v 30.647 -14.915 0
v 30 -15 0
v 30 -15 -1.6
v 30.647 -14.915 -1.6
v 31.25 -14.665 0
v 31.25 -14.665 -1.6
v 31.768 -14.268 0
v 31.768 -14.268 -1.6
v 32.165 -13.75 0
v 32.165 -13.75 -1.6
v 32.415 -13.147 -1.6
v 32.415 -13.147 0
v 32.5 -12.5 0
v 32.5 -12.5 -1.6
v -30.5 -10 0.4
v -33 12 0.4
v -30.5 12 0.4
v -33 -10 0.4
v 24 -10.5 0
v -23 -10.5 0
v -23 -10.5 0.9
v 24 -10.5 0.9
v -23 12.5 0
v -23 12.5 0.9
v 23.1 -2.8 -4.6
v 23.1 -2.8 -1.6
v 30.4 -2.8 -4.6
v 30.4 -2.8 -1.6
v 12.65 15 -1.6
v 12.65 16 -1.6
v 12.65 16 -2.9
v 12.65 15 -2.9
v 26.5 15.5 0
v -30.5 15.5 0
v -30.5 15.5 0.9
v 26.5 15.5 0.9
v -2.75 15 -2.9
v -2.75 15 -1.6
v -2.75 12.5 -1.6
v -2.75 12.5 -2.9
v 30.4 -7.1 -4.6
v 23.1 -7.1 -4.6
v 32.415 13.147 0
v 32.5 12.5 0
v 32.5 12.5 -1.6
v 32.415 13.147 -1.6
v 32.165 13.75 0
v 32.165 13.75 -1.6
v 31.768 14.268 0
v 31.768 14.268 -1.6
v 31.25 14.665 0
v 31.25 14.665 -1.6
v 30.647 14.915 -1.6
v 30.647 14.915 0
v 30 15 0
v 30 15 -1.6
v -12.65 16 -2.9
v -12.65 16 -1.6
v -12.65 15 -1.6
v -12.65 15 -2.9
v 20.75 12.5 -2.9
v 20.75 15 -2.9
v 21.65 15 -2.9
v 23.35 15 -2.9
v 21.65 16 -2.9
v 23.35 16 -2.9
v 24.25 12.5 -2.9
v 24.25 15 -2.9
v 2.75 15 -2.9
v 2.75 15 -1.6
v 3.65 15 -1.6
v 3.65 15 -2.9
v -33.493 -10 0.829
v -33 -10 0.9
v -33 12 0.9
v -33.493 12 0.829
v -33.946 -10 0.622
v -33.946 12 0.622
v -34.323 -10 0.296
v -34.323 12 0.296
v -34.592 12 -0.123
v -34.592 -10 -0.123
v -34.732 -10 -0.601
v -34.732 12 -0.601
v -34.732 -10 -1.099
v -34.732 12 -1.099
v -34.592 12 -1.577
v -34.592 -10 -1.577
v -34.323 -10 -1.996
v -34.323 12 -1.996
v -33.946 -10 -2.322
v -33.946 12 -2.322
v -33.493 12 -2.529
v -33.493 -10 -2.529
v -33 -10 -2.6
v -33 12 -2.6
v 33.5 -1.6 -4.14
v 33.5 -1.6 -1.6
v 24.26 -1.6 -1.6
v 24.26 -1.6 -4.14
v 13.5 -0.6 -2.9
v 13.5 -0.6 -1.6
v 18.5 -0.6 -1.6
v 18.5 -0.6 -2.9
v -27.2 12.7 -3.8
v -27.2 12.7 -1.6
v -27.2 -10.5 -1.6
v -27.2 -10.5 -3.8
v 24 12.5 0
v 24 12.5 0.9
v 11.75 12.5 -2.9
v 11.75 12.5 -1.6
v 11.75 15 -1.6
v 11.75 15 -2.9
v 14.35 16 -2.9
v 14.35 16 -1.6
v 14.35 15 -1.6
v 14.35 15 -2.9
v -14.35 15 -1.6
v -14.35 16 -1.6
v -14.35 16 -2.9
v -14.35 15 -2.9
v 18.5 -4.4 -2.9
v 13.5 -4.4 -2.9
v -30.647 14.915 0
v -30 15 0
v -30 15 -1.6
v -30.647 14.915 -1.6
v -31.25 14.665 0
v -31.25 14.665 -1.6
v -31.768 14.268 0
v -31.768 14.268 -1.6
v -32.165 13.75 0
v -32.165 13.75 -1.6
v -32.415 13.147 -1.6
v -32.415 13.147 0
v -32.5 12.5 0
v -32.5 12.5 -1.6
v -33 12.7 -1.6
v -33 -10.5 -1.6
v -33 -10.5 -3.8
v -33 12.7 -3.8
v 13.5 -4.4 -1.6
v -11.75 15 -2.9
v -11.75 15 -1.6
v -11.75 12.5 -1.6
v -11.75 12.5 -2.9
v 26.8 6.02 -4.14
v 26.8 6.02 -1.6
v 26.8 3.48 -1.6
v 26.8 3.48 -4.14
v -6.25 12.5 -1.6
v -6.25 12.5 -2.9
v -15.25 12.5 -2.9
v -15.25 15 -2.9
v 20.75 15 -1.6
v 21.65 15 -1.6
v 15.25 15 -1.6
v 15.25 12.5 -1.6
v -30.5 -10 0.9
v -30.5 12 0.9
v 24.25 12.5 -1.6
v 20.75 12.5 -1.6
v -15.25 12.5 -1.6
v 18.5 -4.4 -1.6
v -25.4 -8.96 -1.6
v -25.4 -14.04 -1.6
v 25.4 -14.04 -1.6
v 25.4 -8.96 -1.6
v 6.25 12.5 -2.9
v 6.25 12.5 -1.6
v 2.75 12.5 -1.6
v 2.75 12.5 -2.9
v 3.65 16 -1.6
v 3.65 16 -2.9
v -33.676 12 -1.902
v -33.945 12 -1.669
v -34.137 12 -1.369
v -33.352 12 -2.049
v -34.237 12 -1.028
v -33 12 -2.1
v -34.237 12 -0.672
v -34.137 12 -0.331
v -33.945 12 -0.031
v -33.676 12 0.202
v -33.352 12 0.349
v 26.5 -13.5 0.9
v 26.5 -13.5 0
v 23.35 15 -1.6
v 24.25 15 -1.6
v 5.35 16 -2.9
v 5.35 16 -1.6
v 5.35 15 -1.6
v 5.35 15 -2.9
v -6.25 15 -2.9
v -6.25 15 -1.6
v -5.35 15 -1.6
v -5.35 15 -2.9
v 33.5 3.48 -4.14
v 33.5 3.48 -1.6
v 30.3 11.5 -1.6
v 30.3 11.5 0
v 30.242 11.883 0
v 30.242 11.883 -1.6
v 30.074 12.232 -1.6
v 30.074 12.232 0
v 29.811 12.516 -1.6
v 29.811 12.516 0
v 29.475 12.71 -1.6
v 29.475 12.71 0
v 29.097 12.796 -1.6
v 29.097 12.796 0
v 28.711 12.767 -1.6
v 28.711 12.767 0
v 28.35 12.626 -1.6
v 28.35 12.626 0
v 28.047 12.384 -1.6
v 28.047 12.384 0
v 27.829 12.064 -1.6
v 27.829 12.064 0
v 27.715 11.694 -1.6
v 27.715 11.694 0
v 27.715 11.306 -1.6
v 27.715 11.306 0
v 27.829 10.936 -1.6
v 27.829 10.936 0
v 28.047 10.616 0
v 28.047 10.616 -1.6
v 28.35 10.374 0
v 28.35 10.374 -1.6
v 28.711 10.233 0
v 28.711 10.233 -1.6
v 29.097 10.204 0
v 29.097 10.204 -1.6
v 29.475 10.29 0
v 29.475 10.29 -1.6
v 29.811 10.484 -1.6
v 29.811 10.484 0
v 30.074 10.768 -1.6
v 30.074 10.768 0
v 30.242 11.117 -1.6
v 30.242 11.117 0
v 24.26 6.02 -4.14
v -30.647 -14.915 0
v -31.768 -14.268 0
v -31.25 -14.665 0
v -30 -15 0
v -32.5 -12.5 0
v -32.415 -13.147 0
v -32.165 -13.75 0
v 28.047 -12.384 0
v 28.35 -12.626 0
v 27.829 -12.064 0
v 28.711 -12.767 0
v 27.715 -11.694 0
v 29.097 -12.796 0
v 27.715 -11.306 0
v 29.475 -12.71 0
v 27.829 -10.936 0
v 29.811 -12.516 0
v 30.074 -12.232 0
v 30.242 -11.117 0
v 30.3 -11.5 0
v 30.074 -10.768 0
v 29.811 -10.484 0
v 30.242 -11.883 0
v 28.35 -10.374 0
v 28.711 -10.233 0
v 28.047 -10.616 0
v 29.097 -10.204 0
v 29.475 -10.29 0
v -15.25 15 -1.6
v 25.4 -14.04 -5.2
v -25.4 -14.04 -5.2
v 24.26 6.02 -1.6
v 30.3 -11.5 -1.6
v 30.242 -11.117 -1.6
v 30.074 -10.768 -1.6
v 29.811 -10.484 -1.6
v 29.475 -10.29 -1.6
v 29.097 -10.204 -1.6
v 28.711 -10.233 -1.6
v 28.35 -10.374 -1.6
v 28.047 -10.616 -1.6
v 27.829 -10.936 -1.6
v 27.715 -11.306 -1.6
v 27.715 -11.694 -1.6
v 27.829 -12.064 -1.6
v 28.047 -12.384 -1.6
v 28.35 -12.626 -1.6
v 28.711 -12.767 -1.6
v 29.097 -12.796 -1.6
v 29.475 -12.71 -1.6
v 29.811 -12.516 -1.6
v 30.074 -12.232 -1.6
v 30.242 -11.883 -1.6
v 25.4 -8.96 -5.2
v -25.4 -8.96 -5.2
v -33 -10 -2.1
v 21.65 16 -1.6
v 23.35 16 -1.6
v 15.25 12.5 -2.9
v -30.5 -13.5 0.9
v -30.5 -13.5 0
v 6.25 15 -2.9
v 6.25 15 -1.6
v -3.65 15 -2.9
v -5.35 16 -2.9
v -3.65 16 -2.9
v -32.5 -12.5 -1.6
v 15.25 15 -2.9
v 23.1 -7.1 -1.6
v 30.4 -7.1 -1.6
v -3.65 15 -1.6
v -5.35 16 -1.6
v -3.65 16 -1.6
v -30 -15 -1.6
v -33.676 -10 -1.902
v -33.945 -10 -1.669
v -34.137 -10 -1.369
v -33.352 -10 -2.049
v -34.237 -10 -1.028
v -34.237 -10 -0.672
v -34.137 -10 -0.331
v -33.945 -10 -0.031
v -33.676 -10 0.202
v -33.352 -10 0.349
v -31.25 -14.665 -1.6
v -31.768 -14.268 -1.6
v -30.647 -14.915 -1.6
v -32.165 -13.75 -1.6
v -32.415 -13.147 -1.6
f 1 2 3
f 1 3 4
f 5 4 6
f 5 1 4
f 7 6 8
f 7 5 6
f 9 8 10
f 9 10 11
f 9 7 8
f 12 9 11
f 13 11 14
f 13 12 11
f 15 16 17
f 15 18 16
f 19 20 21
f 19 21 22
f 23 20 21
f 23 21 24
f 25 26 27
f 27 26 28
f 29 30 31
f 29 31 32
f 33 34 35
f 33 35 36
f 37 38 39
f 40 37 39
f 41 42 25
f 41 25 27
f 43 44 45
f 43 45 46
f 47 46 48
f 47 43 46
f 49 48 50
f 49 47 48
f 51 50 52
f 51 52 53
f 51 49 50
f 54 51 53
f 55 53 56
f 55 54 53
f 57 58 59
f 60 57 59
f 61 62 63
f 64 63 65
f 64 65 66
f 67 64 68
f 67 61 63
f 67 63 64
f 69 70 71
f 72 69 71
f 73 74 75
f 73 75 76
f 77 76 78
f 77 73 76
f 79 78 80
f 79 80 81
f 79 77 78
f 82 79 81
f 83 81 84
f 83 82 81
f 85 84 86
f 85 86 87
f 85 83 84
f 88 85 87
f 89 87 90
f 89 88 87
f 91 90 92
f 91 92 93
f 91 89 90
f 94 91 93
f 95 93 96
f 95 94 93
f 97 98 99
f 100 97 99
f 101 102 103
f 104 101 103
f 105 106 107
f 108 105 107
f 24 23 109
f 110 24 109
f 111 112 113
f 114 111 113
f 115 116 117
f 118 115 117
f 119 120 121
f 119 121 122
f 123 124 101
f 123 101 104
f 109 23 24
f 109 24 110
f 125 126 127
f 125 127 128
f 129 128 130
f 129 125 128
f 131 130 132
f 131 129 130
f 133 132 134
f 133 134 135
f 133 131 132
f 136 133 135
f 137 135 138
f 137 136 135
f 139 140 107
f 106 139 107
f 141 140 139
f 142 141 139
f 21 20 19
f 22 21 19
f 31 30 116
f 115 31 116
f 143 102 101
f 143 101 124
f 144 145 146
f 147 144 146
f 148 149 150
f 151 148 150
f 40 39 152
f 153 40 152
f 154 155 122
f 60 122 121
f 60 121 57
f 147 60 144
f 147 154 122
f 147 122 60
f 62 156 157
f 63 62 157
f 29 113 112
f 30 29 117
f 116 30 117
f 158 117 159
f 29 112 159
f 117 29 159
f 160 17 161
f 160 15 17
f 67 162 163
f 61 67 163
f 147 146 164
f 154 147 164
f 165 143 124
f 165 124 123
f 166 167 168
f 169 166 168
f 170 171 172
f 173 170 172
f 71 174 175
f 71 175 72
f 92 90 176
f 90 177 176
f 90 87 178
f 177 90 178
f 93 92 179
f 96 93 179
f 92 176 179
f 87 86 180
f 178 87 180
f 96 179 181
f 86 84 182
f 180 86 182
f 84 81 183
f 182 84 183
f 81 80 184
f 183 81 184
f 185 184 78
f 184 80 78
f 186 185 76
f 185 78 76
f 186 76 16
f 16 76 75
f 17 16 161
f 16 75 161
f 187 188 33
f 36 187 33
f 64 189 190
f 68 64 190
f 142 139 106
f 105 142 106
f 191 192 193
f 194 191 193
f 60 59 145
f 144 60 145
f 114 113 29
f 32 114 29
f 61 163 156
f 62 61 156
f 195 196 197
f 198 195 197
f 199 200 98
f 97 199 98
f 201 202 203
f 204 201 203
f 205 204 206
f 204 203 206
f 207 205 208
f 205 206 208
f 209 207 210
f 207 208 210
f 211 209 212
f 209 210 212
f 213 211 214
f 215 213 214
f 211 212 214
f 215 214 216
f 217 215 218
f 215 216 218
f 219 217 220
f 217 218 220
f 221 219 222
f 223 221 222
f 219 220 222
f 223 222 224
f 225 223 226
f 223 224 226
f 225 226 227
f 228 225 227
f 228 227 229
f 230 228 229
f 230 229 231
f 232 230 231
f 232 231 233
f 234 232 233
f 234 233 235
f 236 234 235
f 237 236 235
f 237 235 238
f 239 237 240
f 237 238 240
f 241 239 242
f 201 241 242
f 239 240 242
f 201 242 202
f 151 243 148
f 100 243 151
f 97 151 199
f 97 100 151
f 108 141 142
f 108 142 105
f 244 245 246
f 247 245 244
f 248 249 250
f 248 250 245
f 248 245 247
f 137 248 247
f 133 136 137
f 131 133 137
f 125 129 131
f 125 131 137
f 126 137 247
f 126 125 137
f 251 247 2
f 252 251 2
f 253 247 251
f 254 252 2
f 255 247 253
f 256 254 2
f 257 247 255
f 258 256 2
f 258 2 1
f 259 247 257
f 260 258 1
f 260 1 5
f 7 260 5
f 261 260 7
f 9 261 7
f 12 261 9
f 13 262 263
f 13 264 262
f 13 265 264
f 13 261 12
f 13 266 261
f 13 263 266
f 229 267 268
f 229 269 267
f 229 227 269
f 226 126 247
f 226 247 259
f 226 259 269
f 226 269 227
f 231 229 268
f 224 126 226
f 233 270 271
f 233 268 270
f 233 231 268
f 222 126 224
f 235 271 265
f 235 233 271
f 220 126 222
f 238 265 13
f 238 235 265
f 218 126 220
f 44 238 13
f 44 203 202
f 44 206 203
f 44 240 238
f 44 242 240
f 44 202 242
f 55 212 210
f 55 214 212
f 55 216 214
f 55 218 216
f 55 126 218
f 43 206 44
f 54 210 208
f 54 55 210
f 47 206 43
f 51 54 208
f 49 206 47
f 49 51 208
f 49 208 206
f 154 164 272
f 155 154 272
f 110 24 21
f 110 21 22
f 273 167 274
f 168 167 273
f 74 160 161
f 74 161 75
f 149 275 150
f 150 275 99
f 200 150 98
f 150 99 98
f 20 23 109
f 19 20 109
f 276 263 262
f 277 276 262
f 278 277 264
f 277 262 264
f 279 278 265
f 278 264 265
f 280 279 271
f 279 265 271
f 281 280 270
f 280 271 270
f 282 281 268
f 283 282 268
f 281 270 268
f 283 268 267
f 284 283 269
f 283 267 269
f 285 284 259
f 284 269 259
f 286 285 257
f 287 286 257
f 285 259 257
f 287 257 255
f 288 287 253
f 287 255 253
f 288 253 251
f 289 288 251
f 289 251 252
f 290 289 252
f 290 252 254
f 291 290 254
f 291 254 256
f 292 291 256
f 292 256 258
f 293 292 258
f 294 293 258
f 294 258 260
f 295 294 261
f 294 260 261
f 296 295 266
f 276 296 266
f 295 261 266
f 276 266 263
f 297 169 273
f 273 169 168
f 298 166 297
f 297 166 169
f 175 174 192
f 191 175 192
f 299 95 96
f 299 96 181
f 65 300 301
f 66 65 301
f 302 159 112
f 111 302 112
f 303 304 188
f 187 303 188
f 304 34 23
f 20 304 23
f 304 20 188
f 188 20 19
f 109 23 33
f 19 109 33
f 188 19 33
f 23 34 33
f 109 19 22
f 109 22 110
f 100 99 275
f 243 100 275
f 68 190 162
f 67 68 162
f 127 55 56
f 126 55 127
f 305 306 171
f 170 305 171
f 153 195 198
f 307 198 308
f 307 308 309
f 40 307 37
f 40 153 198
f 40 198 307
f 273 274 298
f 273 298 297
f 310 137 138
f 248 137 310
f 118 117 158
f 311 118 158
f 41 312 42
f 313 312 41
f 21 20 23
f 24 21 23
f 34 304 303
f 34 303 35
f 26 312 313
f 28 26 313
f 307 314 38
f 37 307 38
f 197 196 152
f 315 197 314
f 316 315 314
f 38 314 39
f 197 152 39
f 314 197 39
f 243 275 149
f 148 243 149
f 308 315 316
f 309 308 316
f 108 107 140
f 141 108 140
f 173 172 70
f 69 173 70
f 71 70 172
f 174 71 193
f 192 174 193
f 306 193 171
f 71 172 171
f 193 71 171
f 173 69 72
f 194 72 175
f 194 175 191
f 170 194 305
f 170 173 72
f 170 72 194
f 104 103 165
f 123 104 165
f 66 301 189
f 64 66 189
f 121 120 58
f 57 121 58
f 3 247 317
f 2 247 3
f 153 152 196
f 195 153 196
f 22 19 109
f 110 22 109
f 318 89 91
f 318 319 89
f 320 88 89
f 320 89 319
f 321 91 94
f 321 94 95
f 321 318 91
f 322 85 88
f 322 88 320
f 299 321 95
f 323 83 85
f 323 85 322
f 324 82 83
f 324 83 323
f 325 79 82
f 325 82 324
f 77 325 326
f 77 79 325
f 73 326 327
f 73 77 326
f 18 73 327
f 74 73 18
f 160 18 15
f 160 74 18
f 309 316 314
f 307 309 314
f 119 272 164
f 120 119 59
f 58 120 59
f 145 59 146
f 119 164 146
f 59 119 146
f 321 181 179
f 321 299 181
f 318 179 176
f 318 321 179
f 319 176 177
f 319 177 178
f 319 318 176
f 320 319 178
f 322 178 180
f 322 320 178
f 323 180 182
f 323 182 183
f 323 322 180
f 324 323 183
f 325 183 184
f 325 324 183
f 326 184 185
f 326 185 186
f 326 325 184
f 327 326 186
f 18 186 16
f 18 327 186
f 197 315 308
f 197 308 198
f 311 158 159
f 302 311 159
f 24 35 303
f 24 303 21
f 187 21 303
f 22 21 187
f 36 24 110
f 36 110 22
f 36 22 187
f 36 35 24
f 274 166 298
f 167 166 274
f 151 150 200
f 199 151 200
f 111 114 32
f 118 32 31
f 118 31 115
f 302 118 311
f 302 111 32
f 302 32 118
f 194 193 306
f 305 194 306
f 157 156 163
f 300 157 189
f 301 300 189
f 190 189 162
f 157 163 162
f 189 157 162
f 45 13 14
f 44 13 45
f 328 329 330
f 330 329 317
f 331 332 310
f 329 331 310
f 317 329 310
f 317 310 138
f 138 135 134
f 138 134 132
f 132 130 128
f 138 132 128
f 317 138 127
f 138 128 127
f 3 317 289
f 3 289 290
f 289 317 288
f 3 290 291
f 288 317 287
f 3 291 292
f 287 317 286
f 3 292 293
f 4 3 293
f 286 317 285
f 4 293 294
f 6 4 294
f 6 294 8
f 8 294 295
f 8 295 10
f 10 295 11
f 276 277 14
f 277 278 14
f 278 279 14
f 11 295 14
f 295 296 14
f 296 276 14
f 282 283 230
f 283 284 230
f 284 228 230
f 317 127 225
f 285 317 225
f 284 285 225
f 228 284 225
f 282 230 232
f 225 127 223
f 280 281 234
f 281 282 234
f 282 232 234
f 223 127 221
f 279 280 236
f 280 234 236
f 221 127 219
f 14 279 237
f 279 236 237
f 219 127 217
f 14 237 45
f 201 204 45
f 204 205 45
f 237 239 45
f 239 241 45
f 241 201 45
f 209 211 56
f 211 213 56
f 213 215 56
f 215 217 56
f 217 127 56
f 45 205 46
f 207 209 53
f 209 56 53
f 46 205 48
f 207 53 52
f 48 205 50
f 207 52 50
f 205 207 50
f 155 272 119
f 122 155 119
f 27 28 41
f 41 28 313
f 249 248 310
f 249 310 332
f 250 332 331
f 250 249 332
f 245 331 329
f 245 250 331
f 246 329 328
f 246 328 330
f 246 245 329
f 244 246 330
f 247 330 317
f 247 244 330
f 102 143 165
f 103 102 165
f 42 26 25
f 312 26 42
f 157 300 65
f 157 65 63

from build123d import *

# Parameters (mm, degrees)
F0_R           = 1.3
F1_DEPTH       = 1.6
F2_W           = 47
F2_H           = 23
F3_DEPTH       = 0.9
F2_W_2         = 57
F2_H_2         = 29
F4_DEPTH       = 0.9
F5_W           = 5
F5_H           = 3.8
F6_DEPTH       = 1.3
F5_W_2         = 1.7
F5_H_2         = 1
F7_DEPTH       = 2.2
F5_W_3         = 5.7
F5_H_3         = 5.08
F5_W_4         = 1
F8_DEPTH       = 2.54
F5_W_5         = 7.3
F5_H_4         = 4.3
F9_DEPTH       = 3
F5_W_6         = 50.8
F10_DEPTH      = 3.6
F12_DEPTH      = 10
F12_DEPTH_BACK = 12


with BuildPart() as f1:
    # F0 (on Top) → F1 (new body)
    with BuildSketch(Plane.XY):
        with BuildLine():
            Line((30, 15), (-30, 15))
            ThreePointArc((-30, 15), (-31.767766953, 14.267766953), (-32.5, 12.5))
            Line((-32.5, 12.5), (-32.5, -12.5))
            ThreePointArc((-32.5, -12.5), (-31.767766953, -14.267766953), (-30, -15))
            Line((-30, -15), (30, -15))
            ThreePointArc((30, -15), (31.767766953, -14.267766953), (32.5, -12.5))
            Line((32.5, -12.5), (32.5, 12.5))
            ThreePointArc((32.5, 12.5), (31.767766953, 14.267766953), (30, 15))
        make_face()
        with Locations((29, -11.5)):
            Circle(F0_R, mode=Mode.SUBTRACT)
        with Locations((29, 11.5)):
            Circle(F0_R, mode=Mode.SUBTRACT)
    extrude(amount=-F1_DEPTH)


with BuildPart() as f3:
    # F2 (on Top) → F3 (new body)
    with BuildSketch(Plane.XY):
        with Locations((0.5, 1)):
            Rectangle(F2_W, F2_H)
    extrude(amount=F3_DEPTH)


with BuildPart() as f4:
    # F2 (on Top) → F4 (new body)
    with BuildSketch(Plane.XY):
        with Locations((-2, 1)):
            Rectangle(F2_W_2, F2_H_2)
        with Locations((0.5, 1)):
            Rectangle(F2_W, F2_H, mode=Mode.SUBTRACT)
    extrude(amount=F4_DEPTH)


with BuildPart() as f6:
    # F5 (on face) → F6 (new body)
    with BuildSketch(Plane(origin=(0, 0, -1.6), x_dir=(1, 0, 0), z_dir=(0, 0, -1))):
        with Locations((16, 2.5)):
            Rectangle(F5_W, F5_H)
    extrude(amount=F6_DEPTH)


with BuildPart() as f6b:
    # F5 (on face) → F6, piece 2 (new body)
    with BuildSketch(Plane(origin=(0, 0, -1.6), x_dir=(1, 0, 0), z_dir=(0, 0, -1))):
        Polygon((23.35, -15), (24.25, -15), (24.25, -12.5), (20.75, -12.5), (20.75, -15), (21.65, -15), align=None)
        with Locations((22.5, -15.5)):
            Rectangle(F5_W_2, F5_H_2)
    extrude(amount=F6_DEPTH)


with BuildPart() as f6c:
    # F5 (on face) → F6, piece 3 (new body)
    with BuildSketch(Plane(origin=(0, 0, -1.6), x_dir=(1, 0, 0), z_dir=(0, 0, -1))):
        Polygon((14.35, -15), (15.25, -15), (15.25, -12.5), (11.75, -12.5), (11.75, -15), (12.65, -15), align=None)
        with Locations((13.5, -15.5)):
            Rectangle(F5_W_2, F5_H_2)
    extrude(amount=F6_DEPTH)


with BuildPart() as f6d:
    # F5 (on face) → F6, piece 4 (new body)
    with BuildSketch(Plane(origin=(0, 0, -1.6), x_dir=(1, 0, 0), z_dir=(0, 0, -1))):
        Polygon((5.35, -15), (6.25, -15), (6.25, -12.5), (2.75, -12.5), (2.75, -15), (3.65, -15), align=None)
        with Locations((4.5, -15.5)):
            Rectangle(F5_W_2, F5_H_2)
    extrude(amount=F6_DEPTH)


with BuildPart() as f6e:
    # F5 (on face) → F6, piece 5 (new body)
    with BuildSketch(Plane(origin=(0, 0, -1.6), x_dir=(1, 0, 0), z_dir=(0, 0, -1))):
        Polygon((-3.65, -15), (-2.75, -15), (-2.75, -12.5), (-6.25, -12.5), (-6.25, -15), (-5.35, -15), align=None)
        with Locations((-4.5, -15.5)):
            Rectangle(F5_W_2, F5_H_2)
    extrude(amount=F6_DEPTH)


with BuildPart() as f6f:
    # F5 (on face) → F6, piece 6 (new body)
    with BuildSketch(Plane(origin=(0, 0, -1.6), x_dir=(1, 0, 0), z_dir=(0, 0, -1))):
        Polygon((-15.25, -12.5), (-15.25, -15), (-14.35, -15), (-12.65, -15), (-11.75, -15), (-11.75, -12.5), align=None)
        with Locations((-13.5, -15.5)):
            Rectangle(F5_W_2, F5_H_2)
    extrude(amount=F6_DEPTH)


with BuildPart() as f7:
    # F5 (on face) → F7 (new body)
    with BuildSketch(Plane(origin=(0, 0, -1.6), x_dir=(1, 0, 0), z_dir=(0, 0, -1))):
        with BuildLine():
            Line((-27.2, 10.5), (-32.5, 10.5))
            Line((-32.5, 10.5), (-32.5, -12.5))
            ThreePointArc((-32.5, -12.5), (-32.4979959865, -12.6000802248), (-32.4919871589, -12.7))
            Line((-32.4919871589, -12.7), (-27.2, -12.7))
            Line((-27.2, -12.7), (-27.2, 10.5))
        make_face()
        with BuildLine():
            Line((-32.5, -12.5), (-32.5, 10.5))
            Line((-32.5, 10.5), (-33, 10.5))
            Line((-33, 10.5), (-33, -12.7))
            Line((-33, -12.7), (-32.4919871589, -12.7))
            ThreePointArc((-32.4919871589, -12.7), (-32.4979959865, -12.6000802248), (-32.5, -12.5))
        make_face()
    extrude(amount=F7_DEPTH)


with BuildPart() as f8:
    # F5 (on face) → F8 (new body)
    with BuildSketch(Plane(origin=(0, 0, -1.6), x_dir=(1, 0, 0), z_dir=(0, 0, -1))):
        with Locations((29.65, -0.94)):
            Rectangle(F5_W_3, F5_H_3)
        Polygon((26.8, -6.02), (26.8, -3.48), (26.8, 1.6), (24.26, 1.6), (24.26, -6.02), align=None)
        with Locations((33, -0.94)):
            Rectangle(F5_W_4, F5_H_3)
    extrude(amount=F8_DEPTH)


with BuildPart() as f9:
    # F5 (on face) → F9 (new body)
    with BuildSketch(Plane(origin=(0, 0, -1.6), x_dir=(1, 0, 0), z_dir=(0, 0, -1))):
        with Locations((26.75, 4.95)):
            Rectangle(F5_W_5, F5_H_4)
    extrude(amount=F9_DEPTH)


with BuildPart() as f10:
    # F5 (on face) → F10 (new body)
    with BuildSketch(Plane(origin=(0, 0, -1.6), x_dir=(1, 0, 0), z_dir=(0, 0, -1))):
        with Locations((0, 11.5)):
            Rectangle(F5_W_6, F5_H_3)
    extrude(amount=F10_DEPTH)


with BuildPart() as f12:
    # F11 (on Front) → F12 (new body, two sides)
    with BuildSketch(Plane.XZ) as f12_sk:
        with BuildLine():
            Line((-30.5, 0.4), (-30.5, 0.9))
            Line((-30.5, 0.9), (-33, 0.9))
            ThreePointArc((-33, 0.9), (-34.75, -0.85), (-33, -2.6))
            Line((-33, -2.6), (-33, -2.1))
            ThreePointArc((-33, -2.1), (-34.25, -0.85), (-33, 0.4))
            Line((-33, 0.4), (-30.5, 0.4))
        make_face()
    extrude(amount=F12_DEPTH)
    extrude(f12_sk.sketch, amount=-F12_DEPTH_BACK)


solid = Compound([f1.part, f3.part, f4.part, f6.part, f6b.part, f6c.part, f6d.part, f6e.part, f6f.part, f7.part, f8.part, f9.part, f10.part, f12.part])
